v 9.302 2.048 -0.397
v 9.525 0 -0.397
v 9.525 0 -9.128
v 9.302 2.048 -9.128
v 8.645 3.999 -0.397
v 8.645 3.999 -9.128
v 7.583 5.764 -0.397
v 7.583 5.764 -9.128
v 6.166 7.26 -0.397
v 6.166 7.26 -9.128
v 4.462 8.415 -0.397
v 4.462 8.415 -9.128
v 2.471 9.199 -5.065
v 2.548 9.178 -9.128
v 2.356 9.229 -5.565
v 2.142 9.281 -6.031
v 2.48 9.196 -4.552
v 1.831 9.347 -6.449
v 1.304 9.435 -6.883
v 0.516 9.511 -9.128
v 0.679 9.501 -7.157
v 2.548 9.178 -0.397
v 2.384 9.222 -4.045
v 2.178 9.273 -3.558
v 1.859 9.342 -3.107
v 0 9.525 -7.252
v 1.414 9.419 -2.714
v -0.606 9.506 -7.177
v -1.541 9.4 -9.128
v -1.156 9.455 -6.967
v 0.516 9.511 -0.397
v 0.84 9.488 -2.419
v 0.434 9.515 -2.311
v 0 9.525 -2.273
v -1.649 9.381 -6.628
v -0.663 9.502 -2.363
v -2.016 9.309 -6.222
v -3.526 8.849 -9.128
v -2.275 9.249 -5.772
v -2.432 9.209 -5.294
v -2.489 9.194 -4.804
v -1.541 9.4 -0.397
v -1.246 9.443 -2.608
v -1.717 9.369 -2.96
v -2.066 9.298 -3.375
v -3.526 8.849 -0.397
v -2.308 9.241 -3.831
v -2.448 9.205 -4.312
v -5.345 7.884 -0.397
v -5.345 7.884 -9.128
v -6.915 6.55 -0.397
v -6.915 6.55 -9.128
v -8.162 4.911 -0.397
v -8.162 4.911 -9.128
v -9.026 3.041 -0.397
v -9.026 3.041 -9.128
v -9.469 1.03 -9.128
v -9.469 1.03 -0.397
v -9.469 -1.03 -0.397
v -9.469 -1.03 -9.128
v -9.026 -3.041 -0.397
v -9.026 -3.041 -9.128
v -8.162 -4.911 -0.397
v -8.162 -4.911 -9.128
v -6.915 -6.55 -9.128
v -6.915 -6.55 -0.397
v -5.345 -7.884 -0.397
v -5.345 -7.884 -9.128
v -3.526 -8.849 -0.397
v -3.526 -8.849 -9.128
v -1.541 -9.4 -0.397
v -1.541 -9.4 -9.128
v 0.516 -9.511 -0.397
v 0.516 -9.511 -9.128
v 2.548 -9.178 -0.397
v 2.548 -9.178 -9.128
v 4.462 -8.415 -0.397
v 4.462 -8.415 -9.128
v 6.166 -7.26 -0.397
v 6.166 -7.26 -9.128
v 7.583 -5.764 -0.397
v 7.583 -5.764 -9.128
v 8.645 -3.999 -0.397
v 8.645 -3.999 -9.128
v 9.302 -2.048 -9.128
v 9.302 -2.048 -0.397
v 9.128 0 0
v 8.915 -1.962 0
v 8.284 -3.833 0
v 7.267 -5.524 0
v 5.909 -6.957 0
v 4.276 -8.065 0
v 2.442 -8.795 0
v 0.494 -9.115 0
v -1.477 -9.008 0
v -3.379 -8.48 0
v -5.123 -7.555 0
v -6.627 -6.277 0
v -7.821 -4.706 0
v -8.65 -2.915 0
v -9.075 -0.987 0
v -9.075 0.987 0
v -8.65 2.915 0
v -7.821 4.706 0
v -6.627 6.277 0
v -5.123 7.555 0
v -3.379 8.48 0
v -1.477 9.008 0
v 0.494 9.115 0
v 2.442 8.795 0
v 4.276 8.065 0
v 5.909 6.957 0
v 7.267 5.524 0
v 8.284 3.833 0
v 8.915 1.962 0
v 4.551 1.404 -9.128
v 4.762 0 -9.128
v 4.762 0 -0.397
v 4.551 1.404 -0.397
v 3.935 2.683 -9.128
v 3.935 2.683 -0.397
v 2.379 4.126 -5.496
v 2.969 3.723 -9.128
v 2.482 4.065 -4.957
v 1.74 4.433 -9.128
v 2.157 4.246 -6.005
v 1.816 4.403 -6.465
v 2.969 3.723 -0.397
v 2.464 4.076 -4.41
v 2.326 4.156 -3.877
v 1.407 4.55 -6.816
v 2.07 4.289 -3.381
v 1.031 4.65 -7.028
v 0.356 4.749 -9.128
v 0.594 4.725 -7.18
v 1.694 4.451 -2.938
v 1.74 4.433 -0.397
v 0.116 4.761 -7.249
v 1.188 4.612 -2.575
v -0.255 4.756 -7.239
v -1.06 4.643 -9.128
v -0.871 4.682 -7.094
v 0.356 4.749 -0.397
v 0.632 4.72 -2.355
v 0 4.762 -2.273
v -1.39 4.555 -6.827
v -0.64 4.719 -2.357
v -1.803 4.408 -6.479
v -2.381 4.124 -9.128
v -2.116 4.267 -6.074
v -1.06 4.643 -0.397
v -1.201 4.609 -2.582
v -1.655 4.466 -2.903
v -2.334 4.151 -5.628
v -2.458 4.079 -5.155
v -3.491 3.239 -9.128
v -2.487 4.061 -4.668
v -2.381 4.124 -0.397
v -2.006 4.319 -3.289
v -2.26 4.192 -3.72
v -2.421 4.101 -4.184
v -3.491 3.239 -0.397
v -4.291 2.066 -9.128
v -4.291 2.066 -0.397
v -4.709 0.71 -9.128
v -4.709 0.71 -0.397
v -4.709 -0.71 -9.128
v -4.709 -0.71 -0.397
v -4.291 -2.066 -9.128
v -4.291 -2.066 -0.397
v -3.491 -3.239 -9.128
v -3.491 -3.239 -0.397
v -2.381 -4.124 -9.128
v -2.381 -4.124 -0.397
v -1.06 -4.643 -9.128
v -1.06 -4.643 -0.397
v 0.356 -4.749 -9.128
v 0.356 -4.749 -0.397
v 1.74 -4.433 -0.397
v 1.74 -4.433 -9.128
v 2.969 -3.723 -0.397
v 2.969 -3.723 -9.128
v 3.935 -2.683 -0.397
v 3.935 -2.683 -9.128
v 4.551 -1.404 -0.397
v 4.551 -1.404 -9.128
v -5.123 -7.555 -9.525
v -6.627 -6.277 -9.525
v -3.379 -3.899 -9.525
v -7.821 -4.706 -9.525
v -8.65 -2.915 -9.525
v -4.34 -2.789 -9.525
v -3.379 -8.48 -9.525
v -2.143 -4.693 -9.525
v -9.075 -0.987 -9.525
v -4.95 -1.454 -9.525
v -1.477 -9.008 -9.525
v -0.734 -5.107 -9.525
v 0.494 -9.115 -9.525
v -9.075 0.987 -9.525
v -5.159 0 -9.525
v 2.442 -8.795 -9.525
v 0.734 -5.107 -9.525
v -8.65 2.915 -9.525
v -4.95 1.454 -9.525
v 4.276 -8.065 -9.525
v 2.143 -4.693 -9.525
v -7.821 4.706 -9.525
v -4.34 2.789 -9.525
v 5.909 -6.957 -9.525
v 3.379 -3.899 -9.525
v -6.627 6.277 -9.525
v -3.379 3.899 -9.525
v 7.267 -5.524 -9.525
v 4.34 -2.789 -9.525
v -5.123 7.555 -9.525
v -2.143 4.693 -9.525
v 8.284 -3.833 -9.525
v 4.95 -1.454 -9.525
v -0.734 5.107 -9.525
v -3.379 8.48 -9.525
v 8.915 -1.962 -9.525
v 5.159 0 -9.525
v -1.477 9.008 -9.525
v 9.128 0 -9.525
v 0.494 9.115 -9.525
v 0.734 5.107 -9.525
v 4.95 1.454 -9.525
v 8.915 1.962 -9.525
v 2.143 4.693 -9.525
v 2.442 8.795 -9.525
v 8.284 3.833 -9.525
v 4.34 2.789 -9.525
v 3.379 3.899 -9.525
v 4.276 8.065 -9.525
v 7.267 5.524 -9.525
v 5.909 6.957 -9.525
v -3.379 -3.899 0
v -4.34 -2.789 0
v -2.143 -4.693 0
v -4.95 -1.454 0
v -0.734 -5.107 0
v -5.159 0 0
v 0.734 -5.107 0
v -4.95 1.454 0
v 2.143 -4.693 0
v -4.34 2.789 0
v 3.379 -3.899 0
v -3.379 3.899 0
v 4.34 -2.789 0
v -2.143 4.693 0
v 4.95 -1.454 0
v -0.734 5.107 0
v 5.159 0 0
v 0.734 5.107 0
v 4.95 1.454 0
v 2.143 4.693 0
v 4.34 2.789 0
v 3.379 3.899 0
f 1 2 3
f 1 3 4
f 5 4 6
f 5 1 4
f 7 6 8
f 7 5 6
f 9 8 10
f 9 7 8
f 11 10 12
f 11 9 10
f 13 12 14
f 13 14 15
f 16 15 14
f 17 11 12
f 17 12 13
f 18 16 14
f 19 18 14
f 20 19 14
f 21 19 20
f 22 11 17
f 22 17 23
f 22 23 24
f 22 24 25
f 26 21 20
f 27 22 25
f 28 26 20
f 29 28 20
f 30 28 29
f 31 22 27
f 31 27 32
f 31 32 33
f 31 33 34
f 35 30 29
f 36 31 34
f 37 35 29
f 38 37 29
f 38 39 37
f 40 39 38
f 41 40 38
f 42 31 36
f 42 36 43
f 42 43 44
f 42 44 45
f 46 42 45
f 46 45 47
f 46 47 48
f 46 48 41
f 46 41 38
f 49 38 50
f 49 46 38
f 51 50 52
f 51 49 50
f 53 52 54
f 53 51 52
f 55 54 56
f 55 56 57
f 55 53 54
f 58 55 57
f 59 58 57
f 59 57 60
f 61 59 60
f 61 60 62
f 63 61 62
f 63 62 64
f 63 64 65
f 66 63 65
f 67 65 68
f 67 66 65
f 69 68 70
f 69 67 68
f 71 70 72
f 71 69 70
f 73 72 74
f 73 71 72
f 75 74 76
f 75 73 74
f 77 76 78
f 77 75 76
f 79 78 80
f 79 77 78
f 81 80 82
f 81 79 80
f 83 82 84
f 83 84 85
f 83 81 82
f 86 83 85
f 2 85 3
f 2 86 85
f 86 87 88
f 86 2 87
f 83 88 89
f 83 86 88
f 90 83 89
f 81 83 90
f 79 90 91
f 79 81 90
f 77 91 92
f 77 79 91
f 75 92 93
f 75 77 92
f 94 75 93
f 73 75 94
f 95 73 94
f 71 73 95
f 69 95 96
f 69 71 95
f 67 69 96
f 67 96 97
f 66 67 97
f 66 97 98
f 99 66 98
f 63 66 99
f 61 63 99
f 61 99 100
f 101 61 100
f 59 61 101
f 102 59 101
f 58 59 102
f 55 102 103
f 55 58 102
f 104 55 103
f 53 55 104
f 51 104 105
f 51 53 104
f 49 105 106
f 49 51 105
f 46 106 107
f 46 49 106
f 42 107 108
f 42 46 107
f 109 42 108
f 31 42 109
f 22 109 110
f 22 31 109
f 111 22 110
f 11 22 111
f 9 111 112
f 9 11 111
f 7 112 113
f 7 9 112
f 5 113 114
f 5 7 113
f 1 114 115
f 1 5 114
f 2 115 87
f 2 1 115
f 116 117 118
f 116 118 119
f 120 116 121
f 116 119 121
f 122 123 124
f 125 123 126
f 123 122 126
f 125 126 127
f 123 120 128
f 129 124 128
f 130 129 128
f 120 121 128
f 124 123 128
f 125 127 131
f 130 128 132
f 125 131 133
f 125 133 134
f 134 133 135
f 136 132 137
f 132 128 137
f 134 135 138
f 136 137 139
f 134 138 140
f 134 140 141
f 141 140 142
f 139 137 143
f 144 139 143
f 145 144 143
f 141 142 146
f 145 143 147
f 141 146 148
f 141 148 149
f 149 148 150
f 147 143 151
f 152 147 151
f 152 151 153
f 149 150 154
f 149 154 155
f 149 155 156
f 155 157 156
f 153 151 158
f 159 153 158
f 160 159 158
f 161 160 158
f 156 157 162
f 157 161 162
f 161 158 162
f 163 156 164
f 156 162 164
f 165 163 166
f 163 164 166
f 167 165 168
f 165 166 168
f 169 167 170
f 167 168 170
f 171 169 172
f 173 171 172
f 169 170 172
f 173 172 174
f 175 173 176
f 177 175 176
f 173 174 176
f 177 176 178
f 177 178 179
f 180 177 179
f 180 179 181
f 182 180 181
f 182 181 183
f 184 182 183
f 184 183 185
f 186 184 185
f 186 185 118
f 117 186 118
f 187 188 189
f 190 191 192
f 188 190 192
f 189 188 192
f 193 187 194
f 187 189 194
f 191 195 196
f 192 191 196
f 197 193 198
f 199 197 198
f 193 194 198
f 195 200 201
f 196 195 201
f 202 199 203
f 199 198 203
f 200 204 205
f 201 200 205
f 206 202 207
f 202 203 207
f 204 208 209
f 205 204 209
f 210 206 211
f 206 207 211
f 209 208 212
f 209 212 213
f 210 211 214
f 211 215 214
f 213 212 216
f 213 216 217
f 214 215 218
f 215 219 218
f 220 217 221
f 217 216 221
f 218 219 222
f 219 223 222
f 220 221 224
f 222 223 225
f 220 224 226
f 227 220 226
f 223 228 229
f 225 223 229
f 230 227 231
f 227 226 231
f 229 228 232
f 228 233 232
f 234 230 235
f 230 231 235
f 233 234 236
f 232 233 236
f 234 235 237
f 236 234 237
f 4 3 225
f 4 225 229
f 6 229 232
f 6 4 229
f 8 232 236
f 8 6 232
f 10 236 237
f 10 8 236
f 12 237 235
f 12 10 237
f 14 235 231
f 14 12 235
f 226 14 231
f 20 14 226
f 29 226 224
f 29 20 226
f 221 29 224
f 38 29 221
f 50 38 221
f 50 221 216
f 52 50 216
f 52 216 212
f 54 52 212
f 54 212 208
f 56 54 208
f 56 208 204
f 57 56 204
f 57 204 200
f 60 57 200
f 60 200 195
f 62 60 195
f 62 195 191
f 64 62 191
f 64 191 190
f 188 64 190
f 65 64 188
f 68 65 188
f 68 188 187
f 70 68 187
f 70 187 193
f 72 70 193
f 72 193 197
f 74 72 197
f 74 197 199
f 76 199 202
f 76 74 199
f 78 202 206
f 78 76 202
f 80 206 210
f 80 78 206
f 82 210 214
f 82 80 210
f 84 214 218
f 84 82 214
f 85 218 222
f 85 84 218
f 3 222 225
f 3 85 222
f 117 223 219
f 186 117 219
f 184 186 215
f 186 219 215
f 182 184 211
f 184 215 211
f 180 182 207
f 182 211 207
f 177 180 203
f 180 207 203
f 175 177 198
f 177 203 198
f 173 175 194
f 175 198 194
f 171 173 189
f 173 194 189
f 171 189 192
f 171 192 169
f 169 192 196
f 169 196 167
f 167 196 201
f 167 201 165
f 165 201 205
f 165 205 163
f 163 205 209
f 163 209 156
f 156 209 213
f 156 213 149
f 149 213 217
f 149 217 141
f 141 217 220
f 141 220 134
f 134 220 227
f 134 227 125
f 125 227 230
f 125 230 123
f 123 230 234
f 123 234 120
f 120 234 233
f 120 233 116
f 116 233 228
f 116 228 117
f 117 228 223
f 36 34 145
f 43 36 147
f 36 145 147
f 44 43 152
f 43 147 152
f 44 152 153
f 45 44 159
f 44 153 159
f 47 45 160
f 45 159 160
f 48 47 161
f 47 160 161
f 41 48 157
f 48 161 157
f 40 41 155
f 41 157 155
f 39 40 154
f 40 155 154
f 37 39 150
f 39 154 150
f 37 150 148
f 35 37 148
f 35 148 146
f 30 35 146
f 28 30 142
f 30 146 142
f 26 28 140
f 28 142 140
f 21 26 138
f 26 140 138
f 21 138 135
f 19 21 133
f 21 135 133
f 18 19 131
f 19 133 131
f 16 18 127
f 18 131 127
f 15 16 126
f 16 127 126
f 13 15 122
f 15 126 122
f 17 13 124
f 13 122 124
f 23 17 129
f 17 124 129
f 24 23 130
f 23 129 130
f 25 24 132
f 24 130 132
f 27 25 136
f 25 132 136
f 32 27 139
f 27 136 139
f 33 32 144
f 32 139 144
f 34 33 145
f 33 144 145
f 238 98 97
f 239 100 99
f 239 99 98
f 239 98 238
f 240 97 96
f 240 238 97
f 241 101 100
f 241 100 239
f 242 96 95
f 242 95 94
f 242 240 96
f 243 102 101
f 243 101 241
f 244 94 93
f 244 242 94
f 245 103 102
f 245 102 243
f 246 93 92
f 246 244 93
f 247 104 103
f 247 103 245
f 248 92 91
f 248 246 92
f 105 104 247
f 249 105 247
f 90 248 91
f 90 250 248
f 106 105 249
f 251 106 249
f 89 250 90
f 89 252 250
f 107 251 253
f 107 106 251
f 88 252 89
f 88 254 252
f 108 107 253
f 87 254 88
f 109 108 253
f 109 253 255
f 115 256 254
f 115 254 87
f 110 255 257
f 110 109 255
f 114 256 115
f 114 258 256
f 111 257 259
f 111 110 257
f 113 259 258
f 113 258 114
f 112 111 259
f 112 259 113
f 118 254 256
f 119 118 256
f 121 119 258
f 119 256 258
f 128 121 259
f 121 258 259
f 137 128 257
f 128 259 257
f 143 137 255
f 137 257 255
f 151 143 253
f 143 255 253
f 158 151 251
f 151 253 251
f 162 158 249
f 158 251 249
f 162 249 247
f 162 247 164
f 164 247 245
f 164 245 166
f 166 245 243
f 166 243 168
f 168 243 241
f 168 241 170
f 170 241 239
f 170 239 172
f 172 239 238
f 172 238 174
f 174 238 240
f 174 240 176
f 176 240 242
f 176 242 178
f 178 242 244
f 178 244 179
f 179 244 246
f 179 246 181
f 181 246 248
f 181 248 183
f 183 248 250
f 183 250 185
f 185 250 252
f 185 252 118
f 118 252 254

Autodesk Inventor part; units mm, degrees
ref_plane "YZ Plane" through (0, 0, 0) normal (1, 0, 0) x (0, 1, 0)
ref_plane "XY Plane" through (0, 0, 0) normal (0, 0, 1) x (1, 0, 0)
sketch "Sketch1" plane through (0, 0, 0) normal (0, 0, 1) x (1, 0, 0)
  circle A0 centre (0, 0) radius 9.525
  dimension "d0" = 19.05
extrude "Extrusion1" add sketch "Sketch1" against normal blind 9.525
sketch "Sketch2" plane through (0, 0, 0) normal (0, 0, 1) x (1, 0, 0)
  circle A0 centre (0, 0) radius 9.525 projected
  circle A1 centre (0, 0) radius 4.7625
  dimension "d3" = 9.525
extrude "Extrusion2" cut sketch "Sketch2" against normal up to next contours A1
chamfer "Chamfer1" distance 0.3969 angle 45 4 edges at (-9.525, 0, 0) (-9.525, 0, -9.525) (-4.7625, 0, 0) (-4.7625, 0, -9.525)
ref_plane "Work Plane1" through (0, 9.525, 0) normal (0, 1, 0) x (-1, 0, 0)
sketch "Sketch3" plane through (0, 9.525, 0) normal (0, 1, 0) x (-1, 0, 0)
  line L0 (9.1281, -9.525) -> (-9.1281, -9.525) projected
  line L1 (9.525, -0.3969) -> (9.525, -9.1281) projected
  point P0 (0, 0)
  point P1 (0, -4.7625)
  point P2 (0, -9.525)
  point P3 (9.525, -4.7625)
hole "Hole1" at (0, 9.525, -4.7625) direction (0, -1, 0) diameter 4.9784 end up to surface thread size "1/4-20 UNC" class "2B" standard "ANSI Unified Screw Threads"
properties part number "Misc_ShaftCollar_Ruland_SC-6-F" material "Steel, Carbon"
